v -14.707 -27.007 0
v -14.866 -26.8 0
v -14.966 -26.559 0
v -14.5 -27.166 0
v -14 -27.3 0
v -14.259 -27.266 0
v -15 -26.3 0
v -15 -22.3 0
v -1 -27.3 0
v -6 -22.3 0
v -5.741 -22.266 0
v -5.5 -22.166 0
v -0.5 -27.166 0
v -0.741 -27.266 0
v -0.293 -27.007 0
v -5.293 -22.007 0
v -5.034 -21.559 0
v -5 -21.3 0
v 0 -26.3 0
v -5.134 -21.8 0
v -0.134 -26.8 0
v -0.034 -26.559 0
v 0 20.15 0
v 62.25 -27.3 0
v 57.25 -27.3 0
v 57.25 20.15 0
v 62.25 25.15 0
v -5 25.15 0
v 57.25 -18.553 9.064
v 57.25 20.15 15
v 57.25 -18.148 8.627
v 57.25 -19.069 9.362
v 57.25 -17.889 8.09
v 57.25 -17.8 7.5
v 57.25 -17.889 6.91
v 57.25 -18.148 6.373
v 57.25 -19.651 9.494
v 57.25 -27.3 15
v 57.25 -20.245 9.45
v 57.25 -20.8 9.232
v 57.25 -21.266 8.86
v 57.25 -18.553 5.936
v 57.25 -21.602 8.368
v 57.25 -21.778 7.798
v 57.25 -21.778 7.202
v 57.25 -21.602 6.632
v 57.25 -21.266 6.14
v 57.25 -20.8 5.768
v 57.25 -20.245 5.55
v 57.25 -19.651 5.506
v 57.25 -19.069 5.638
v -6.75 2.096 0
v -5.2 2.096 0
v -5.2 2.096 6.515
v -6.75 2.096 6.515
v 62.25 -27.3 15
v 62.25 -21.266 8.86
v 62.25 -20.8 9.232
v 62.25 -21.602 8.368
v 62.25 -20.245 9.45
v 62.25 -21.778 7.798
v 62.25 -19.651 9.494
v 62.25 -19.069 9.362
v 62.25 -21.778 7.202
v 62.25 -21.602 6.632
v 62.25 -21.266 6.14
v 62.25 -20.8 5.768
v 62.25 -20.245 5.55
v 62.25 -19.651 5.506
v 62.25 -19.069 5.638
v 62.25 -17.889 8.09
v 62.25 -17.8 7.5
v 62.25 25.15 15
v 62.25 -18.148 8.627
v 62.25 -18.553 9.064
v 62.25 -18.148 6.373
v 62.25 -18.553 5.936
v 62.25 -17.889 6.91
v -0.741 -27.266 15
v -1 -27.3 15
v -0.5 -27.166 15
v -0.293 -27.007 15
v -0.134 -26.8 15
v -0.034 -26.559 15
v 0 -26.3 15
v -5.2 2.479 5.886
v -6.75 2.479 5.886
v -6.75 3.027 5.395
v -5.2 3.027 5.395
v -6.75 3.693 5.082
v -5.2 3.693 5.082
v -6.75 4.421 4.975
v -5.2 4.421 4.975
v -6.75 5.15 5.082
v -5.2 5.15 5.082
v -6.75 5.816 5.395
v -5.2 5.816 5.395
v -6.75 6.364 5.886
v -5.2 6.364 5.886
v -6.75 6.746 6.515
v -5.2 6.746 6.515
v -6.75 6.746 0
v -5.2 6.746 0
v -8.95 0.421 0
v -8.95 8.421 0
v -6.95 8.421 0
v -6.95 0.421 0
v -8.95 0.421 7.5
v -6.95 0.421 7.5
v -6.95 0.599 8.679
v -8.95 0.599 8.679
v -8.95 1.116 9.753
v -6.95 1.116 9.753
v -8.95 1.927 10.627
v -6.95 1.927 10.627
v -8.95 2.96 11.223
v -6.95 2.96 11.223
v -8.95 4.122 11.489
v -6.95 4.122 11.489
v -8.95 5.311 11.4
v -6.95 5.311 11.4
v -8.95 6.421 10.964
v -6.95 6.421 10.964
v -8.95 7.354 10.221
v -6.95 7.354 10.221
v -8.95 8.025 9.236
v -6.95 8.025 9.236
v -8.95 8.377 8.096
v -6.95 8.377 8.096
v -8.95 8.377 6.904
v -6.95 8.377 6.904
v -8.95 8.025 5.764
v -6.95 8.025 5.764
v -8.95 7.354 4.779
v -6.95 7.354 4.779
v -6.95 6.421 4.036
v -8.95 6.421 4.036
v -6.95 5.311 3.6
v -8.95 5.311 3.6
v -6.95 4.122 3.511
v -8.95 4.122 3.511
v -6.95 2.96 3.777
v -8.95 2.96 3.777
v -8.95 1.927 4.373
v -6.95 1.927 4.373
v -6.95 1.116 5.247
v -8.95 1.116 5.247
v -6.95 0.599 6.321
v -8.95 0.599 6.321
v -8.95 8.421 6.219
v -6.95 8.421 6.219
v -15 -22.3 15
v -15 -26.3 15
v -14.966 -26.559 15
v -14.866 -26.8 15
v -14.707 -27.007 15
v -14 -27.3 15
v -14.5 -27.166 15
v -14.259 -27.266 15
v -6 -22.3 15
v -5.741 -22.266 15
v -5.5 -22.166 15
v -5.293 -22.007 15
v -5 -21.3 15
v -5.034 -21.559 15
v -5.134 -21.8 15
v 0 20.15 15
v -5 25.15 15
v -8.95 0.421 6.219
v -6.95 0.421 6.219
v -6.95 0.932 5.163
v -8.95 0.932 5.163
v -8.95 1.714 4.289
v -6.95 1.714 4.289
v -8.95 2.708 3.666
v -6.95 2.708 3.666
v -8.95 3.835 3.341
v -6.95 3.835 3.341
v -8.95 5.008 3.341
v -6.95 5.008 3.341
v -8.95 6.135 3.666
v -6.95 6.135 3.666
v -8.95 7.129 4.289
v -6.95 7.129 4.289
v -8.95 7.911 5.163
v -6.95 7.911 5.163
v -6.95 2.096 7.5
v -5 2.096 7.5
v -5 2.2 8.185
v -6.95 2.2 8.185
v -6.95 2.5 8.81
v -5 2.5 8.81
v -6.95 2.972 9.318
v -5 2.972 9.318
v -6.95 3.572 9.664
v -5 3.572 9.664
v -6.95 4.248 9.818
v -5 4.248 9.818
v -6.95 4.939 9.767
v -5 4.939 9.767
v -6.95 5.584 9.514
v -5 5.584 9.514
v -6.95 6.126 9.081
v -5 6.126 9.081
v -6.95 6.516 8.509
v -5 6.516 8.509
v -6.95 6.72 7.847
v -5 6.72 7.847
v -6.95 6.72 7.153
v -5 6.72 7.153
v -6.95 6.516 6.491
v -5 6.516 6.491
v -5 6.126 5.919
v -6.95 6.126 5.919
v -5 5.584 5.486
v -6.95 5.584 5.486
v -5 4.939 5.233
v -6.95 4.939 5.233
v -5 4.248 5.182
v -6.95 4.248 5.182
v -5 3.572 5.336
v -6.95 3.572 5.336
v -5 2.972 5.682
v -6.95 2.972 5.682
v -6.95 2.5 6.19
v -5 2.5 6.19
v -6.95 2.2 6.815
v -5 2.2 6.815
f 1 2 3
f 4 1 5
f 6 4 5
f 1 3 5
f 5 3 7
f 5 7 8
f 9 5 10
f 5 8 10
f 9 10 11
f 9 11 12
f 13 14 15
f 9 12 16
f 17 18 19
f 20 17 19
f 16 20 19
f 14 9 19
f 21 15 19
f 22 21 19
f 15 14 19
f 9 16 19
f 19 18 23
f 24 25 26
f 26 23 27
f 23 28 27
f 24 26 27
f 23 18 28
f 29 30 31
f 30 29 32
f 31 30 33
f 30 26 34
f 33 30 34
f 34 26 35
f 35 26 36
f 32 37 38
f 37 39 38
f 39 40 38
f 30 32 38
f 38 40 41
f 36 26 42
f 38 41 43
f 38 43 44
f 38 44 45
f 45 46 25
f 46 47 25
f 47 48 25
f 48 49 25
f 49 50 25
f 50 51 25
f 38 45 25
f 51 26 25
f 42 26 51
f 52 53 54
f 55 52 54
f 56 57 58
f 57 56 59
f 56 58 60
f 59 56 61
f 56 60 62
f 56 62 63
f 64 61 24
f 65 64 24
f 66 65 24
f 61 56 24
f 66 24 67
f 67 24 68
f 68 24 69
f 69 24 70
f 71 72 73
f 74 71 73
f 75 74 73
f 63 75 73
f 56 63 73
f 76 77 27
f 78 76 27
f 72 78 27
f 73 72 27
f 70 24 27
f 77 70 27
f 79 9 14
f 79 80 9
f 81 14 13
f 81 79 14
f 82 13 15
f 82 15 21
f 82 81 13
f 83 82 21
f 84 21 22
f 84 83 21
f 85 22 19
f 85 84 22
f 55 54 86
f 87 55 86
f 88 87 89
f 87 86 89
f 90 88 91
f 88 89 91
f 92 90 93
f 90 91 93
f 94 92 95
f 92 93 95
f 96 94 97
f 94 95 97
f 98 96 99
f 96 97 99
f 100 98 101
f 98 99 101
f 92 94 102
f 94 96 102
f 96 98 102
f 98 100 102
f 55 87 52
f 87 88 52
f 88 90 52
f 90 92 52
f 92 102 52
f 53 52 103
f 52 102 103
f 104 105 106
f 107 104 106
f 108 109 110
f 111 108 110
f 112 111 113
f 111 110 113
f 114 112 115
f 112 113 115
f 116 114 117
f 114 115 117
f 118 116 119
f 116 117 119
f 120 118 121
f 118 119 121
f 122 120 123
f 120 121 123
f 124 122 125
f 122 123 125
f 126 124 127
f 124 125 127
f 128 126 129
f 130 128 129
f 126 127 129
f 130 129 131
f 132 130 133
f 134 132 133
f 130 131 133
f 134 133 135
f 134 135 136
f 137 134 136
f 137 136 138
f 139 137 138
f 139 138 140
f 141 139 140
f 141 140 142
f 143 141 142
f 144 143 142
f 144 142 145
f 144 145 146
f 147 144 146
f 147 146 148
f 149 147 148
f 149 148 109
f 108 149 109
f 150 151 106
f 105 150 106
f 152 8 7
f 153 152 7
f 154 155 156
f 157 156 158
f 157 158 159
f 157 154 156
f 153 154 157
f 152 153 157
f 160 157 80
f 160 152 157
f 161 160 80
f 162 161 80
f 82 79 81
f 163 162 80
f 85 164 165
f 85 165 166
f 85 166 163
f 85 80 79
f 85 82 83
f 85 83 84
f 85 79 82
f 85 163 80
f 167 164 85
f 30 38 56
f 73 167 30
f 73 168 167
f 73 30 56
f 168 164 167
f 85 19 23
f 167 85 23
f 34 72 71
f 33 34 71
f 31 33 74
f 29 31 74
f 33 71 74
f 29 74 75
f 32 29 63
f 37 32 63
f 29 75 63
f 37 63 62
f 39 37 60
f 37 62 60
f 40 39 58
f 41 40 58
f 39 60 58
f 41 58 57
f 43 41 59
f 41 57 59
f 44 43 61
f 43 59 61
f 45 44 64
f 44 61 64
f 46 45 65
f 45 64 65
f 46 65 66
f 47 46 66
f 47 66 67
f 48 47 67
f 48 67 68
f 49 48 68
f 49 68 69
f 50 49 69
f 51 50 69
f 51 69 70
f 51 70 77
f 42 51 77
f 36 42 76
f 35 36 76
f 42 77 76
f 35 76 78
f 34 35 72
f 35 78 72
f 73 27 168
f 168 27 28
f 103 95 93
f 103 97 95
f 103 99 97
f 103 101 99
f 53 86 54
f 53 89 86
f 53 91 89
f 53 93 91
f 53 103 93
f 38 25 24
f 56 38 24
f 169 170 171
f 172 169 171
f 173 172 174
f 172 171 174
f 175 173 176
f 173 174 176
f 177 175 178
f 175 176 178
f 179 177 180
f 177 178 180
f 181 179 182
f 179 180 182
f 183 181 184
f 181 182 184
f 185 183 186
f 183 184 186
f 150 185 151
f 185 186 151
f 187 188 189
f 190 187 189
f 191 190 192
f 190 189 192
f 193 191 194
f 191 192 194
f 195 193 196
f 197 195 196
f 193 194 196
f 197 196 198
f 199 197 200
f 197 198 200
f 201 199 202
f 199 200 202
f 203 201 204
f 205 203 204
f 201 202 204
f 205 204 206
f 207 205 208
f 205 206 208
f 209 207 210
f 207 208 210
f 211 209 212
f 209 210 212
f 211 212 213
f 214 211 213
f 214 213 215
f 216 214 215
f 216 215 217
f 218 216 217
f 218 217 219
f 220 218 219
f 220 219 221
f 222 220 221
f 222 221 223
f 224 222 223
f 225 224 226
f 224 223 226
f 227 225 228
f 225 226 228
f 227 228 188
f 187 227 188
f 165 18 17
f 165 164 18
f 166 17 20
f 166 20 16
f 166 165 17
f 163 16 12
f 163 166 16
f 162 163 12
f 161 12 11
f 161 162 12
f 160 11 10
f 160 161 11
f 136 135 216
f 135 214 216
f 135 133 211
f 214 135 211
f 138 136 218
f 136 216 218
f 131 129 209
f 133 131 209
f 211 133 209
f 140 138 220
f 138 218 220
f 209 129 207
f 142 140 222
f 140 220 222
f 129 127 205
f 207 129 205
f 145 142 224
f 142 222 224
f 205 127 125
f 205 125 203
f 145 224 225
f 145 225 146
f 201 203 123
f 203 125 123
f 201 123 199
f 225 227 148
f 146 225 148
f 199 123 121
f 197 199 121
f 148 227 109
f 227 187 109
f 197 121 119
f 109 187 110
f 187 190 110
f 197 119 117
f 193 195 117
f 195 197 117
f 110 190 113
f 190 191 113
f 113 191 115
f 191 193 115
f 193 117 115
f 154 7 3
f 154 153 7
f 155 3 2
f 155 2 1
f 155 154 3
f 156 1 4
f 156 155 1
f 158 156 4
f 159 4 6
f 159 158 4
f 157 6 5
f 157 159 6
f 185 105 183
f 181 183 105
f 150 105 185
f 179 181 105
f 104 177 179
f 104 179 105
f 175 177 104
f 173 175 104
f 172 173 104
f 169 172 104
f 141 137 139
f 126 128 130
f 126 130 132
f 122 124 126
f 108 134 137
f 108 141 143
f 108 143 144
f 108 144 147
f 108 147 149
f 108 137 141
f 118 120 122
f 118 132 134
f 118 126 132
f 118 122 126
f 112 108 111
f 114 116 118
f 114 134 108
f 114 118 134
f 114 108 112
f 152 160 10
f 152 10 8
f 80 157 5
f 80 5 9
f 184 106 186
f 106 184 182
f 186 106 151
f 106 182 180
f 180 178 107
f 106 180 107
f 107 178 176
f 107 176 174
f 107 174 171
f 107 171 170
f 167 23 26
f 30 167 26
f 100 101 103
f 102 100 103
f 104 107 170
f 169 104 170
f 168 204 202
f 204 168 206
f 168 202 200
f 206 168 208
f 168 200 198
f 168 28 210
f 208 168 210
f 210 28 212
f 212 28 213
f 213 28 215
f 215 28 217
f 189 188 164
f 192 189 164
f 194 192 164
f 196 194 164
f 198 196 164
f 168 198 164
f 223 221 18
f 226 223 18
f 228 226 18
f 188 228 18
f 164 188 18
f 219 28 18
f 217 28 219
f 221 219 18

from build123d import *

# Parameters (mm, degrees)
F1_DEPTH  = 15
F2_R      = 2.325
F3_DEPTH  = 1.95
F4_R      = 4
F5_DEPTH  = 2
F6_W      = 0.2
F6_H      = 4.65
F7_REACH  = 19.6552990879
F8_R      = 1
F9_R      = 2
F10_DEPTH = 5


with BuildPart() as f1:
    # F0 (on Top) → F1 (new body)
    with BuildSketch(Plane.XY):
        Polygon((0, 0), (0, 20.15), (57.25, 20.15), (57.25, -27.3), (62.25, -27.3), (62.25, 25.15), (-5, 25.15), (-5, 0), (-5, -22.3), (-15, -22.3), (-15, -27.3), (0, -27.3), (0, -22.3), align=None)
    extrude(amount=F1_DEPTH)

    # F2 (on face) → F3 (join)
    with BuildSketch(Plane(origin=(-5, 0, 0), x_dir=(0, -1, 0), z_dir=(-1, 0, 0))):
        with Locations((-4.4213766232, 7.5)):
            Circle(F2_R)
        with BuildLine():
            ThreePointArc((-2.0963766232, 6.5151142198), (-4.4213766232, 4.975), (-6.7463766232, 6.5151142198))
            Line((-6.7463766232, 6.5151142198), (-6.7463766232, 0))
            Line((-6.7463766232, 0), (-2.0963766232, 0))
            Line((-2.0963766232, 0), (-2.0963766232, 6.5151142198))
        make_face()
    extrude(amount=F3_DEPTH)

    # F4 (on face) → F5 (join)
    with BuildSketch(Plane(origin=(-6.95, 0, 0), x_dir=(0, -1, 0), z_dir=(-1, 0, 0))):
        with Locations((-4.4213766232, 7.5)):
            Circle(F4_R)
        with BuildLine():
            ThreePointArc((-0.4213766232, 6.2193751525), (-4.4213766232, 3.3), (-8.4213766232, 6.2193751525))
            Line((-8.4213766232, 6.2193751525), (-8.4213766232, 0))
            Line((-8.4213766232, 0), (-0.4213766232, 0))
            Line((-0.4213766232, 0), (-0.4213766232, 6.2193751525))
        make_face()
    extrude(amount=F5_DEPTH)

    f7_end = f1.faces().sort_by_distance((-5.975, 4.4213766232, 4.975))[0]
    # F6 (on face) → F7 (cut, up to a face of the model that its end follows)
    with BuildSketch(Plane(origin=(0, 0, 0), x_dir=(1, 0, 0), z_dir=(0, 0, -1))):
        with Locations((-5.1, -4.4213766232)):
            Rectangle(F6_W, F6_H)
        with Locations((-6.85, -4.4213766232)):
            Rectangle(F6_W, F6_H)
    f7_long = extrude(amount=-F7_REACH, mode=Mode.PRIVATE)
    add(split(f7_long, bisect_by=f7_end, keep=Keep.BOTTOM, mode=Mode.PRIVATE), mode=Mode.SUBTRACT)

    # F8
    f8_edges = [f1.edges().sort_by_distance(p)[0] for p in [
        (-5, -22.3, 7.5),
        (0, -27.3, 7.5),
        (-15, -27.3, 7.5),
    ]]
    fillet(f8_edges, radius=F8_R)

    # F9 (on face) → F10 (cut, through all)
    with BuildSketch(Plane.YZ.offset(62.25)):
        with Locations((-19.8, 7.5)):
            Circle(F9_R)
    extrude(amount=-F10_DEPTH, mode=Mode.SUBTRACT)


solid = f1.part
